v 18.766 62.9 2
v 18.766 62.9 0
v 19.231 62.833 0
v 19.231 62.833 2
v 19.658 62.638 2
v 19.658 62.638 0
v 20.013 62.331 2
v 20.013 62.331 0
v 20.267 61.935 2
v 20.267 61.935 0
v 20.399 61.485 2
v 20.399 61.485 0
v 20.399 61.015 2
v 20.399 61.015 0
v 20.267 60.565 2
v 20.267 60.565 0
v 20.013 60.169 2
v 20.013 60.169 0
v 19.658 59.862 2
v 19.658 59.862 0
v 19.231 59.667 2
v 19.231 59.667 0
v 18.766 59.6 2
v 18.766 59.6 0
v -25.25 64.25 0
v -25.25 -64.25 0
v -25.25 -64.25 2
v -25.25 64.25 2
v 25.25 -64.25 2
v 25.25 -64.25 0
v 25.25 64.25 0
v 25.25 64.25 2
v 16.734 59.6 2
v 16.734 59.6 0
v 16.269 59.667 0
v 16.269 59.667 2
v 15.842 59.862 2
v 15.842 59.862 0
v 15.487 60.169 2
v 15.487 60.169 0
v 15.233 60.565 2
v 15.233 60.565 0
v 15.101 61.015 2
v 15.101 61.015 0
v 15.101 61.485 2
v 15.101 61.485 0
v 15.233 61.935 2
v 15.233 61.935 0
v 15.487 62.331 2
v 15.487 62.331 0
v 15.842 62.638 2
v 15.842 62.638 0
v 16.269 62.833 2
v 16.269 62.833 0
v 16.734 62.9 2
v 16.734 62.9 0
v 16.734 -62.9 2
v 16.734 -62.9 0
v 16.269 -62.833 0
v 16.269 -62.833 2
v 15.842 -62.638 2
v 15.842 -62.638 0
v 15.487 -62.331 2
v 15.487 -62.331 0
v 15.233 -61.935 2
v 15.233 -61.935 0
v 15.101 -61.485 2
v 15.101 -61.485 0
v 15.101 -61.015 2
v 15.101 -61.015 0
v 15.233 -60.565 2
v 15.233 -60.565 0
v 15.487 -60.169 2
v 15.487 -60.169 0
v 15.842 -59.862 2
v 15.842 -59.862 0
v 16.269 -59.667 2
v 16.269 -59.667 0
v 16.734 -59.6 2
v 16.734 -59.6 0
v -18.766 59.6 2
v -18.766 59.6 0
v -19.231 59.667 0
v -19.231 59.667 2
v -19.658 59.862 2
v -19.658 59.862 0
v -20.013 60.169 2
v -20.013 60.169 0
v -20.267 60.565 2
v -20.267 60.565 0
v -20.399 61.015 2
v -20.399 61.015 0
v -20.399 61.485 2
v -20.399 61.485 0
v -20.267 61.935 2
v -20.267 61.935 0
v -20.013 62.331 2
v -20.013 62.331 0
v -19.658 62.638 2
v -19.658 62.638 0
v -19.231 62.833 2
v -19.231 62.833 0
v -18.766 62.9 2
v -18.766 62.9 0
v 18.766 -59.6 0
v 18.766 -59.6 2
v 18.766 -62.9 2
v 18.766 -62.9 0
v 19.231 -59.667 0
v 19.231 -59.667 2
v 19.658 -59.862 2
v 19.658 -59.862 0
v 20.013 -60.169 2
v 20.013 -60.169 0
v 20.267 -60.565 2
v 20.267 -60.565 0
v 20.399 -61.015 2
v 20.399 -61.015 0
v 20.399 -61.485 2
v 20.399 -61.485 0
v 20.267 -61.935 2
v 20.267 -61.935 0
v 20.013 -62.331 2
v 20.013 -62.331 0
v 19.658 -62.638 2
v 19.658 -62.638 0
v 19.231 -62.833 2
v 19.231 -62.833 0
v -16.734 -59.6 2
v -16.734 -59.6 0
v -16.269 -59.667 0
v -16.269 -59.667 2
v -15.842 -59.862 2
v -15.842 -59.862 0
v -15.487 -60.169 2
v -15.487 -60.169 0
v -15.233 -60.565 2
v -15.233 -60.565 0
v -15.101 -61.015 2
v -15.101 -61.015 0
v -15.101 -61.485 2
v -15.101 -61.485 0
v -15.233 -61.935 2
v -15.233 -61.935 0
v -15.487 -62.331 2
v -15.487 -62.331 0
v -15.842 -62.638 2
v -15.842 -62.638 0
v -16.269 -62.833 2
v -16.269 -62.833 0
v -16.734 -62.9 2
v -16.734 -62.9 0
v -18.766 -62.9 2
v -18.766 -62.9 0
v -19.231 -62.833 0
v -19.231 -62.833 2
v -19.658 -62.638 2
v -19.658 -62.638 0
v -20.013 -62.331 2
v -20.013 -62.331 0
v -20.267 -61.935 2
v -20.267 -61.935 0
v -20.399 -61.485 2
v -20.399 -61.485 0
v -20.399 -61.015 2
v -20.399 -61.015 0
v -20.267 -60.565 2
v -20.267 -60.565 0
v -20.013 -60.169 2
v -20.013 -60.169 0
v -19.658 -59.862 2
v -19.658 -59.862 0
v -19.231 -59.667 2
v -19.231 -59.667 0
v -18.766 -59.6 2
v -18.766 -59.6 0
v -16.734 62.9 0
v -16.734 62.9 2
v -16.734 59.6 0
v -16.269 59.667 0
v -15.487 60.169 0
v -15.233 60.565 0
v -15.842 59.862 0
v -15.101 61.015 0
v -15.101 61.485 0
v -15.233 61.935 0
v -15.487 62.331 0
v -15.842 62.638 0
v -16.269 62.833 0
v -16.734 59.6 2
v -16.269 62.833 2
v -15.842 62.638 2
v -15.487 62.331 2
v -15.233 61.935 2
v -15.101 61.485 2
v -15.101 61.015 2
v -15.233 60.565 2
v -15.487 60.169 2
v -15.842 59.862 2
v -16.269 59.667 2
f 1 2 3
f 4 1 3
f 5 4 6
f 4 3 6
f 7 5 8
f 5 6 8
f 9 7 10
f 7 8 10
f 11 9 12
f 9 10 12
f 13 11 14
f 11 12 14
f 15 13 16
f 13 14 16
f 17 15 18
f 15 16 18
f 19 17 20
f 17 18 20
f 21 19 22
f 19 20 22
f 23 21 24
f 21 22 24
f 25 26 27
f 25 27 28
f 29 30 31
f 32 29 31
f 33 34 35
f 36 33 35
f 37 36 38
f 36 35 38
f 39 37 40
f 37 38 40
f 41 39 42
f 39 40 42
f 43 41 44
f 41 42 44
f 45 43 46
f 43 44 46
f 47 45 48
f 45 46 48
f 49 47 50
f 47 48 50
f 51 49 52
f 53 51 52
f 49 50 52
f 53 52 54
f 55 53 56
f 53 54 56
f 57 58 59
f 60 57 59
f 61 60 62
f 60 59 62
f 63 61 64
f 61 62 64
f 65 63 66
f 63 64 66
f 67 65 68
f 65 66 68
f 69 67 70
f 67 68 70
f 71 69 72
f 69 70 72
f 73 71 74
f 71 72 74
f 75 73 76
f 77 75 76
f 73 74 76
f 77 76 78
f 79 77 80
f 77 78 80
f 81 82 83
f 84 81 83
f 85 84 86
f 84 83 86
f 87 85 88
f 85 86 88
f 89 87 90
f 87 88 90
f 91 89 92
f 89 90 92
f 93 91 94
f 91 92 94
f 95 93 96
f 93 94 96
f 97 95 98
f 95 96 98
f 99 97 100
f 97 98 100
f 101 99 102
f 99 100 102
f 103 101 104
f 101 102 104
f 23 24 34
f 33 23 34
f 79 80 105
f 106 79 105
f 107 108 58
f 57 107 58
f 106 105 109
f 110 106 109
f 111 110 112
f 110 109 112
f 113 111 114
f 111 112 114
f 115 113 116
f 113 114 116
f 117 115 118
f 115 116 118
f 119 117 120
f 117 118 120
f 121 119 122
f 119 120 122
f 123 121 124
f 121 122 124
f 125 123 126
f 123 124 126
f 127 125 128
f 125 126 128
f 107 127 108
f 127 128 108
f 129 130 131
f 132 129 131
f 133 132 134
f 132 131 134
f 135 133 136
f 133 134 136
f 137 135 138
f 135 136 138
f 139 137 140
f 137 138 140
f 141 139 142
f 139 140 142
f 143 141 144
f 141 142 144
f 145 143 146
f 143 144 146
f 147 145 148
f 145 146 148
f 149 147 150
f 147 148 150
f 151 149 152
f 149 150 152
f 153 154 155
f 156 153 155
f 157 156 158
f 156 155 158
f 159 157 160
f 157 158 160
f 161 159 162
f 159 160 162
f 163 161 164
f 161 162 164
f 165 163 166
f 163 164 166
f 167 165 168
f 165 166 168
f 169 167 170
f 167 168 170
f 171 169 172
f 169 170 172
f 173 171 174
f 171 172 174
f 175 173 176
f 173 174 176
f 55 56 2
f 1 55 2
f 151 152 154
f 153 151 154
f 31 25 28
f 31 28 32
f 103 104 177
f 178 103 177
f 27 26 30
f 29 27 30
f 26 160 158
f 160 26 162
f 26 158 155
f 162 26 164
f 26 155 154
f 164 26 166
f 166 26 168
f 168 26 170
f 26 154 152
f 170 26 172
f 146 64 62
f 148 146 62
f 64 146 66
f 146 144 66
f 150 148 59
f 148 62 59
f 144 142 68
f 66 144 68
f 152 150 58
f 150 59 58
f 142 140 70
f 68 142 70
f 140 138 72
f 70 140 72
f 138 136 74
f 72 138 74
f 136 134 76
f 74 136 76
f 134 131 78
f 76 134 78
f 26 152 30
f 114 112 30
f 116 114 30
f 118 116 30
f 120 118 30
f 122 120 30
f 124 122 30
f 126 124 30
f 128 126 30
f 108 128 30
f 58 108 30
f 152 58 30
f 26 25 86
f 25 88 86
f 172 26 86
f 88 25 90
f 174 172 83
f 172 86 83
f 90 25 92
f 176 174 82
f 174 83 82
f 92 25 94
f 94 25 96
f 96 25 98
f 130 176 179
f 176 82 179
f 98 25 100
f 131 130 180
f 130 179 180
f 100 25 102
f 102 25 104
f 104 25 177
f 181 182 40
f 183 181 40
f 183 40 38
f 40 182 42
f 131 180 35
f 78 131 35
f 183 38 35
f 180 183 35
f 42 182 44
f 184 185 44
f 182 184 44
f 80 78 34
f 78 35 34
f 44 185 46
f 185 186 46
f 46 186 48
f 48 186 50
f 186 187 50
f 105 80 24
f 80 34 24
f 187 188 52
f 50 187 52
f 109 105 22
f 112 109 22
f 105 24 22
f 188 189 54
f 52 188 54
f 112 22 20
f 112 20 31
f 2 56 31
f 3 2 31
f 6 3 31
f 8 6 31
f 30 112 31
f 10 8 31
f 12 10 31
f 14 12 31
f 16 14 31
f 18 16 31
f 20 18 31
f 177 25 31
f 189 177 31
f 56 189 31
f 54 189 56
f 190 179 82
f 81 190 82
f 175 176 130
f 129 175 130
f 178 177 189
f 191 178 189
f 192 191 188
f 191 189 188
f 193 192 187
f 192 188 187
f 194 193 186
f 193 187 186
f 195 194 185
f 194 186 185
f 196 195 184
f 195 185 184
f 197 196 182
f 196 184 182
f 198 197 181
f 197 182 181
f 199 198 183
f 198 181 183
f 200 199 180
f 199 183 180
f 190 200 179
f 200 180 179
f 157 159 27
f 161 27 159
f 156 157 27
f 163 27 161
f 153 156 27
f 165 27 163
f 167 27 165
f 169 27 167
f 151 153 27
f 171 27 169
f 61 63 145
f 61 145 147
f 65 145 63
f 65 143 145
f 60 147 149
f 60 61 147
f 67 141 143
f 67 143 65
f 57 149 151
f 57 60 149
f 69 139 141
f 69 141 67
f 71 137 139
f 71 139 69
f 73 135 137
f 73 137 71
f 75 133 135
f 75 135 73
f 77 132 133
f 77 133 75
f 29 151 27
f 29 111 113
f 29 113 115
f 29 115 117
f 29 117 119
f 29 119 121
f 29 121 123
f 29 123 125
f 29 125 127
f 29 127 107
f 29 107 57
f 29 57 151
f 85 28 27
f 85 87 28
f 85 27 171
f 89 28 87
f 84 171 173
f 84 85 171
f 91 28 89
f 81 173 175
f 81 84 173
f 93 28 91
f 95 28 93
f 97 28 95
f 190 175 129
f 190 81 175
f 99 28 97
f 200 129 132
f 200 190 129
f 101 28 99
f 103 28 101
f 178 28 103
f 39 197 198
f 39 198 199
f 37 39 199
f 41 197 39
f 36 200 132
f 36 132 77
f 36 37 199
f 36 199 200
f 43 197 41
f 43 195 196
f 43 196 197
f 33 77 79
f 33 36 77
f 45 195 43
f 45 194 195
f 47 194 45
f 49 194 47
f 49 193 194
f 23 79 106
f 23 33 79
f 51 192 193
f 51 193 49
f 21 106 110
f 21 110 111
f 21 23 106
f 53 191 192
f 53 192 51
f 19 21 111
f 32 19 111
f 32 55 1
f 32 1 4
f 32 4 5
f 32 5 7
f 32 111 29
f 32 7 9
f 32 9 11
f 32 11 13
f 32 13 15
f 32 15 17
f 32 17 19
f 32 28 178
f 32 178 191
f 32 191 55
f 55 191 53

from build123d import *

# Parameters (mm, degrees)
SKETCH1_W           = 50.5
SKETCH1_H           = 128.5
BOSS_EXTRUDE1_DEPTH = 2


with BuildPart() as part:
    # Sketch1 → Boss-Extrude1 (new body)
    with BuildSketch(Plane.XY):
        Rectangle(SKETCH1_W, SKETCH1_H)
        with BuildLine():
            Line((-18.766, -59.6), (-16.734, -59.6))
            ThreePointArc((-16.734, -59.6), (-15.084, -61.25), (-16.734, -62.9))
            Line((-16.734, -62.9), (-18.766, -62.9))
            ThreePointArc((-18.766, -62.9), (-20.416, -61.25), (-18.766, -59.6))
        make_face(mode=Mode.SUBTRACT)
        with BuildLine():
            Line((-18.766, 62.9), (-16.734, 62.9))
            ThreePointArc((-16.734, 62.9), (-15.084, 61.25), (-16.734, 59.6))
            Line((-16.734, 59.6), (-18.766, 59.6))
            ThreePointArc((-18.766, 59.6), (-20.416, 61.25), (-18.766, 62.9))
        make_face(mode=Mode.SUBTRACT)
        with BuildLine():
            Line((16.734000014, 62.9), (18.766000014, 62.9))
            ThreePointArc((18.766000014, 62.9), (20.416000014, 61.25), (18.766000014, 59.6))
            Line((18.766000014, 59.6), (16.734000014, 59.6))
            ThreePointArc((16.734000014, 59.6), (15.084000014, 61.25), (16.734000014, 62.9))
        make_face(mode=Mode.SUBTRACT)
        with BuildLine():
            Line((16.734000014, -59.6), (18.766000014, -59.6))
            ThreePointArc((18.766000014, -59.6), (20.416000014, -61.25), (18.766000014, -62.9))
            Line((18.766000014, -62.9), (16.734000014, -62.9))
            ThreePointArc((16.734000014, -62.9), (15.084000014, -61.25), (16.734000014, -59.6))
        make_face(mode=Mode.SUBTRACT)
    extrude(amount=BOSS_EXTRUDE1_DEPTH)


solid = part.part
